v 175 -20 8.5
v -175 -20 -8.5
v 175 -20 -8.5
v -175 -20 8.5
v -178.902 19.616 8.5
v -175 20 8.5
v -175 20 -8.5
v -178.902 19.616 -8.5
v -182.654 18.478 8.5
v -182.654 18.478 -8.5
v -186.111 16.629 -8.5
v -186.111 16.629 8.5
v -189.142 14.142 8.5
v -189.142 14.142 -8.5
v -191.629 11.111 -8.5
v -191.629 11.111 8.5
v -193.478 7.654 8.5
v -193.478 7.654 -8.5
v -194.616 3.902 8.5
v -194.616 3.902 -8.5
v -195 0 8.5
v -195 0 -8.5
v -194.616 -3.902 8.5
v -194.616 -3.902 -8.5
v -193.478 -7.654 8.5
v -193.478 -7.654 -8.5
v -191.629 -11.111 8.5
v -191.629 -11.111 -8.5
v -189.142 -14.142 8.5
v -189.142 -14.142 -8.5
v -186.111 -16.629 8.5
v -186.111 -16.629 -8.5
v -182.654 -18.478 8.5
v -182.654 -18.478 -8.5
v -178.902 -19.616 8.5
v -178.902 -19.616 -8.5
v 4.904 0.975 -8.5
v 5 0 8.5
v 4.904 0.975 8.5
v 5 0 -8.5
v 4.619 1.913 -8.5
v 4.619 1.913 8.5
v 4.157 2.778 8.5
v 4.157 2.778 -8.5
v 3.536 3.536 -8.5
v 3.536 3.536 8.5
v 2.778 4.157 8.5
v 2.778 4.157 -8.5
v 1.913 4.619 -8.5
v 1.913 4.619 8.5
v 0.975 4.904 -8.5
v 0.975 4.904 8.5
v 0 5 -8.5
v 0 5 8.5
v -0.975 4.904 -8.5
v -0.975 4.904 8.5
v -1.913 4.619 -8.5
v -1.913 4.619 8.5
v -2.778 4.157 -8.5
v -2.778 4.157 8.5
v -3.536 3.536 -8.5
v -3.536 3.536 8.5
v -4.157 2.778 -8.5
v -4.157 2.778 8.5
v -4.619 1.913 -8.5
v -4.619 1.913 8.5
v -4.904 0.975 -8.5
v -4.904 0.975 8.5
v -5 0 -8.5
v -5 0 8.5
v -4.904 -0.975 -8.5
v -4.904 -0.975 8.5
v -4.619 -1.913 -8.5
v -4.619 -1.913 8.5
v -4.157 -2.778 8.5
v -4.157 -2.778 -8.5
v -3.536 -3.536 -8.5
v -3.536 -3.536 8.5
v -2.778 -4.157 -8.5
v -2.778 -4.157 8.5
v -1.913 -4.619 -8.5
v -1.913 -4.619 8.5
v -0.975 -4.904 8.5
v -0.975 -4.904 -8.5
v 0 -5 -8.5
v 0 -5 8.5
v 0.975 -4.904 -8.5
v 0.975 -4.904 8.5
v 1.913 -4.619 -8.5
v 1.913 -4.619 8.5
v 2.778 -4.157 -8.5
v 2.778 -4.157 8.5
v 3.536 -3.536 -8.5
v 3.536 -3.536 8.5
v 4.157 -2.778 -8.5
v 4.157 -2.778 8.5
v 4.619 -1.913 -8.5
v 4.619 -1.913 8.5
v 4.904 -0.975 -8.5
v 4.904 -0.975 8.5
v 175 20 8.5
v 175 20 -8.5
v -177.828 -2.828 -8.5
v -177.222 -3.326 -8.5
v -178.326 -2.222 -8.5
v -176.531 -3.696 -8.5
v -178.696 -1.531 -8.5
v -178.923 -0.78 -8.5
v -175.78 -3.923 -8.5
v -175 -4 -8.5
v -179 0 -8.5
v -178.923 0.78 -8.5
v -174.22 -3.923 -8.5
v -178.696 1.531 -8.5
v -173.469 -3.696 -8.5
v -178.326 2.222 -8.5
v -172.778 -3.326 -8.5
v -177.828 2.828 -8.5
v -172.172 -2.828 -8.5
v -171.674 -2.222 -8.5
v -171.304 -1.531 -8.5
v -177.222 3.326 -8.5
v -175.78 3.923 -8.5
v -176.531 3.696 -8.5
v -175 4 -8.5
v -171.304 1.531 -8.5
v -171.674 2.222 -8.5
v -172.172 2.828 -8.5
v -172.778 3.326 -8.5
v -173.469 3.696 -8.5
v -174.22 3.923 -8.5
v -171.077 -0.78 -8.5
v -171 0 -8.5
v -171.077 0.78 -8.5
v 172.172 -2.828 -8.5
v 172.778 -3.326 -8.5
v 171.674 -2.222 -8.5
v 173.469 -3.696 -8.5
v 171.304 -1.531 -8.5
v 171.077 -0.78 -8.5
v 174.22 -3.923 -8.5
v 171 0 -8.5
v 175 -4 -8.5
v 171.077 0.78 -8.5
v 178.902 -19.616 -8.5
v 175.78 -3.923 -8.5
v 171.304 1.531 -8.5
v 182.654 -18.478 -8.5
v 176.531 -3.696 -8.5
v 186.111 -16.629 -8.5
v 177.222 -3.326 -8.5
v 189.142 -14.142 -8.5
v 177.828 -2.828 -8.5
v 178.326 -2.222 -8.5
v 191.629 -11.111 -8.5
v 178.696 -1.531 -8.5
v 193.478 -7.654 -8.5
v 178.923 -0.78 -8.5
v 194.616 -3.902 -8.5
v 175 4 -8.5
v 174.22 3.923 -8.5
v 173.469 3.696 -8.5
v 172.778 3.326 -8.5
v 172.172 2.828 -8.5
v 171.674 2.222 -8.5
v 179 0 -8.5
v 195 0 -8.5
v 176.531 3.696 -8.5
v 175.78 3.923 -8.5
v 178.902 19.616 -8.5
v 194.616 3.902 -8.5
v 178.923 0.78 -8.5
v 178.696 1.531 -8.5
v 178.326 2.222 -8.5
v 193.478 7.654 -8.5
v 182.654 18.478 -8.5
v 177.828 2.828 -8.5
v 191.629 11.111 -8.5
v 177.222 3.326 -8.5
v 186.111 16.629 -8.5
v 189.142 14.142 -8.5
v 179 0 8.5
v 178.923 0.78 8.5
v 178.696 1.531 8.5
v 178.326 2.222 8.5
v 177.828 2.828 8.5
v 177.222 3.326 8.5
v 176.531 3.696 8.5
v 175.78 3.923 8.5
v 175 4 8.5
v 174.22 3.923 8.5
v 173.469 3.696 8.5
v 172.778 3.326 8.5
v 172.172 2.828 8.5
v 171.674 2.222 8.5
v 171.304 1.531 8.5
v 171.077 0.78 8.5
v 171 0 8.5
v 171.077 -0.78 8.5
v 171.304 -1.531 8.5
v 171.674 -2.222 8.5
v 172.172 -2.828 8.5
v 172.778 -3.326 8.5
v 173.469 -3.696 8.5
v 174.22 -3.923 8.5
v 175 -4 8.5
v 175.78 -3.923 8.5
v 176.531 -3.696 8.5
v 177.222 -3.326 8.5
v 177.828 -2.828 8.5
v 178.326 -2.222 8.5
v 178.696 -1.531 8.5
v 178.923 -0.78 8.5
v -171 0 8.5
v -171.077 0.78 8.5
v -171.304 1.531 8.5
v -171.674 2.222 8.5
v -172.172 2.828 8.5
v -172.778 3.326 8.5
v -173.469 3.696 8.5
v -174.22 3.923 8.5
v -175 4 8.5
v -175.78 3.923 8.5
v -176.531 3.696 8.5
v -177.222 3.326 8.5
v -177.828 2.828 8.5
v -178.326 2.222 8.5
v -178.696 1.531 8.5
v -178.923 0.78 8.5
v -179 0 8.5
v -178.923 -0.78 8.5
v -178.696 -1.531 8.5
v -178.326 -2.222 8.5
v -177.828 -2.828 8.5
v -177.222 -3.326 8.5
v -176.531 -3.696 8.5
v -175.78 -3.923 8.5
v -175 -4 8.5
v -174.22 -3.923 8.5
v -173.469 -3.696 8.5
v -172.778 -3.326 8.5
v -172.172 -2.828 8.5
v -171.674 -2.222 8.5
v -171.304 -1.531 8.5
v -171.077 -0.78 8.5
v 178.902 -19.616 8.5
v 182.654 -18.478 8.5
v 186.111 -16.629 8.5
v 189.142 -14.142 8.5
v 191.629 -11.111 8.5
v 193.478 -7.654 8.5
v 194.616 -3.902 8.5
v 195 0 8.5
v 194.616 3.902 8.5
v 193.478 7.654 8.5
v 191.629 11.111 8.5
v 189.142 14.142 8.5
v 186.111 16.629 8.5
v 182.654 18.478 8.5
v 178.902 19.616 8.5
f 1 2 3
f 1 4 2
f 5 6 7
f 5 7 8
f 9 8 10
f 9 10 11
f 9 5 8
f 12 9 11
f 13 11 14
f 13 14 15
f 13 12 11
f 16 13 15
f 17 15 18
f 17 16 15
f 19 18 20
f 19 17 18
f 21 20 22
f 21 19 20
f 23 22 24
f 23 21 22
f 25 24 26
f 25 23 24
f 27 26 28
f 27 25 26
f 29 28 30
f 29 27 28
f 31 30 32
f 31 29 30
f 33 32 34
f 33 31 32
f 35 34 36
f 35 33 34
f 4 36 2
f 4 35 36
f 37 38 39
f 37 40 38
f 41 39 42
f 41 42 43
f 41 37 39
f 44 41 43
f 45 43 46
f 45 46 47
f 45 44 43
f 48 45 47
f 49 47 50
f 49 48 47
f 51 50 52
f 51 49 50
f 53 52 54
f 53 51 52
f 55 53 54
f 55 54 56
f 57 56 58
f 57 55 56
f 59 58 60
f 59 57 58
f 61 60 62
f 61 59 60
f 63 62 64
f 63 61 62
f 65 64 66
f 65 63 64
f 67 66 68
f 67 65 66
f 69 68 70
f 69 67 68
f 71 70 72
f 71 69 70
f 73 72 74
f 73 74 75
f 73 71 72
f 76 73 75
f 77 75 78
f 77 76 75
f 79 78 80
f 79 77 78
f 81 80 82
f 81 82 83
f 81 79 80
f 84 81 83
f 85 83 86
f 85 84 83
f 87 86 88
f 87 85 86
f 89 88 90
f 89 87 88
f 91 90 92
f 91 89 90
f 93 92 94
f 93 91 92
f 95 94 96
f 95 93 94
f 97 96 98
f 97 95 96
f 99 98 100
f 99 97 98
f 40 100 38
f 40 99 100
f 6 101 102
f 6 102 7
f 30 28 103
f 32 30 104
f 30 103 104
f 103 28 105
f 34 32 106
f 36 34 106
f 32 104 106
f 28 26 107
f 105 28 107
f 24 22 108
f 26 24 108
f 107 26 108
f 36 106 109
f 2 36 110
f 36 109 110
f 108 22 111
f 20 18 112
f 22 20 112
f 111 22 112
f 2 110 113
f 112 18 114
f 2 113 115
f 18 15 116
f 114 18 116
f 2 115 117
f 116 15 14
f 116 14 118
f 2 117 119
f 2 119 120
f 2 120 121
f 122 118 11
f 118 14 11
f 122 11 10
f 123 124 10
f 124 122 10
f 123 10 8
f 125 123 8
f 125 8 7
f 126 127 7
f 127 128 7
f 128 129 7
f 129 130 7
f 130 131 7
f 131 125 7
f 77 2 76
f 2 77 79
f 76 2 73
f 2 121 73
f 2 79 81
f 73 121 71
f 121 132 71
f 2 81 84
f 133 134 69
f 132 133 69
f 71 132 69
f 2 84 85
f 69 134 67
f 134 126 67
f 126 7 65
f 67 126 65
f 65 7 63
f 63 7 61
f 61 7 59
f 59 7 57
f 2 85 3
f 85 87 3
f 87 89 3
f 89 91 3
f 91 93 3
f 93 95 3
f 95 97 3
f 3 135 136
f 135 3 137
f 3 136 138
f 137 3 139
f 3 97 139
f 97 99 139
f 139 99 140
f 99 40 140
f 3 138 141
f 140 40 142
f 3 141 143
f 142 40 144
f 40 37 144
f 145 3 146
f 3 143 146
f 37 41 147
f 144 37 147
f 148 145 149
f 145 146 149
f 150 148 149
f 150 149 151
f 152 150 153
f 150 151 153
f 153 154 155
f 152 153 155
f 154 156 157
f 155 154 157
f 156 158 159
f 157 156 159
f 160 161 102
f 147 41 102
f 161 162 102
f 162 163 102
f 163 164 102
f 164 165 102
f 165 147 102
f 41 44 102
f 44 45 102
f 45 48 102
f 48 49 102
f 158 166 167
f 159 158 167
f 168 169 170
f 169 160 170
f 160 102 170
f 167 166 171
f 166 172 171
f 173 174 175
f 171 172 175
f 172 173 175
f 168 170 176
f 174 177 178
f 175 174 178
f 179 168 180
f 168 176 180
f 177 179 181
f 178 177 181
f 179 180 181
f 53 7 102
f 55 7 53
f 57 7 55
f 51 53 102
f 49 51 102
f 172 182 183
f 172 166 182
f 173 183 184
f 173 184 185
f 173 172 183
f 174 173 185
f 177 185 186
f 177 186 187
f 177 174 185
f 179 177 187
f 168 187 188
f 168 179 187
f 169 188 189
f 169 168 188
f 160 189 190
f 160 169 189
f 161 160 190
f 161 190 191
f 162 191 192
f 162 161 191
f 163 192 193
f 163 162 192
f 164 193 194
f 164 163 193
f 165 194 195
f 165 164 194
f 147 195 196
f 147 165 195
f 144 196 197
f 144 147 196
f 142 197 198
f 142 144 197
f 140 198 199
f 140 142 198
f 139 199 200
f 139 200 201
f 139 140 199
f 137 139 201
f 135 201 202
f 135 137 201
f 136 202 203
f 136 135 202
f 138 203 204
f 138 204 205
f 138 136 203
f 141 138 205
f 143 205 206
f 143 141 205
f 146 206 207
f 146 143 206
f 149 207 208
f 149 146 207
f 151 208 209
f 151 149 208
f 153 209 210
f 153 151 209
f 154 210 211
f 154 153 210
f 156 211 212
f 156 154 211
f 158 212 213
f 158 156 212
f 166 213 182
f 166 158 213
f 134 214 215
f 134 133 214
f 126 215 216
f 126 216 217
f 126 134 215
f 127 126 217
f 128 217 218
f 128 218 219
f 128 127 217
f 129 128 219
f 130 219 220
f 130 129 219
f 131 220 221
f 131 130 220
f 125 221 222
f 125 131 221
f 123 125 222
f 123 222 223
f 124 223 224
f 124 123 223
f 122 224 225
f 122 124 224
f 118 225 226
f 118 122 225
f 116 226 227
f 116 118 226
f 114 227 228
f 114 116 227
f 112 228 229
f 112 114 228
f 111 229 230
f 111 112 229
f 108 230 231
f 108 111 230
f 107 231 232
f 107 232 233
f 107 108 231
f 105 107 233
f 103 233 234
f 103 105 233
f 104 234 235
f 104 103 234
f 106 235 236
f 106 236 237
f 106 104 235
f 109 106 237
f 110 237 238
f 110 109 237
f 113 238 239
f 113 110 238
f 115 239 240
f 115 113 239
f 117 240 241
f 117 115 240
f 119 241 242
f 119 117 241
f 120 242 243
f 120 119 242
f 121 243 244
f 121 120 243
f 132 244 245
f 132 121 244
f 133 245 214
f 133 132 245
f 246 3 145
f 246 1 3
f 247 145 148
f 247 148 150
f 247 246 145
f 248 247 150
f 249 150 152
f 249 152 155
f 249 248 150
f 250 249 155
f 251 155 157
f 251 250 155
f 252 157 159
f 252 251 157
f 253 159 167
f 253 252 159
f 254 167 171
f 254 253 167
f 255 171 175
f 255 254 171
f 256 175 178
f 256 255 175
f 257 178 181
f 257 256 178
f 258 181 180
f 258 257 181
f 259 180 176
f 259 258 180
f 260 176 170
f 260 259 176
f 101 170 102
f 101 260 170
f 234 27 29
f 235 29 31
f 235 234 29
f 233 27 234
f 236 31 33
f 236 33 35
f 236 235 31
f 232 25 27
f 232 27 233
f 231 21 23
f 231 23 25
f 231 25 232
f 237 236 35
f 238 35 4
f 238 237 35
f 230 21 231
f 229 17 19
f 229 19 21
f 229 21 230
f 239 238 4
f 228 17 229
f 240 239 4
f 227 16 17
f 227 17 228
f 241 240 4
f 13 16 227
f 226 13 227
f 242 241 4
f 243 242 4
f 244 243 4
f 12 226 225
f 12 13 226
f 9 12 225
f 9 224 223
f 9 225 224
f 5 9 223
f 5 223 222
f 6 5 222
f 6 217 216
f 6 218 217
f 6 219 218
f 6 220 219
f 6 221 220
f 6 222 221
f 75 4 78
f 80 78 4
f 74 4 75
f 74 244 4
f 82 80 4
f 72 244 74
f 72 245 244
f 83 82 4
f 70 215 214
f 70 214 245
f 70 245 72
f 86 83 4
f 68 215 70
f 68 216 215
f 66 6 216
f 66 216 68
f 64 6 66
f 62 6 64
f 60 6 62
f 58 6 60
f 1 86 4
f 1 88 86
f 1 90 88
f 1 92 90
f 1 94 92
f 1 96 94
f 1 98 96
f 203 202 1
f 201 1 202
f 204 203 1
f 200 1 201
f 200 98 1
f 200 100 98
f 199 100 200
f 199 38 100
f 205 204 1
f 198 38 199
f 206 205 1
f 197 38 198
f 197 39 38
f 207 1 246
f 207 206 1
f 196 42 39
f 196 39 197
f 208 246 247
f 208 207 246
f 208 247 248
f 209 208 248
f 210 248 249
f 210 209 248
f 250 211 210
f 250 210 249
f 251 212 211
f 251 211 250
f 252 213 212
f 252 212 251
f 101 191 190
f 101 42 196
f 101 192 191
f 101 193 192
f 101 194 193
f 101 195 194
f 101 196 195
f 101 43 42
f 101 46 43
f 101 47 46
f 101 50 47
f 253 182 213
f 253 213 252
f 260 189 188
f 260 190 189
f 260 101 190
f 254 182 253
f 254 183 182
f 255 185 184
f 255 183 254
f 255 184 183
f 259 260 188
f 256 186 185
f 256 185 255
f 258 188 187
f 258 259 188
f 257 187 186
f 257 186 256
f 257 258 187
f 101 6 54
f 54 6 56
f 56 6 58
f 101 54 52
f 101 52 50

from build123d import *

# Parameters (mm, degrees)
F0_R     = 4
F0_R_2   = 5
F1_DEPTH = 8.5


with BuildPart() as f1:
    # F0 (on Top) → F1 (new body, symmetric)
    with BuildSketch(Plane.XY):
        with BuildLine():
            ThreePointArc((175, -20), (195, 0), (175, 20))
            Line((175, 20), (-175, 20))
            ThreePointArc((-175, 20), (-195, 0), (-175, -20))
            Line((-175, -20), (175, -20))
        make_face()
        with Locations((-175, 0)):
            Circle(F0_R, mode=Mode.SUBTRACT)
        Circle(F0_R_2, mode=Mode.SUBTRACT)
        with Locations((175, 0)):
            Circle(F0_R, mode=Mode.SUBTRACT)
    extrude(amount=F1_DEPTH, both=True)


solid = f1.part
